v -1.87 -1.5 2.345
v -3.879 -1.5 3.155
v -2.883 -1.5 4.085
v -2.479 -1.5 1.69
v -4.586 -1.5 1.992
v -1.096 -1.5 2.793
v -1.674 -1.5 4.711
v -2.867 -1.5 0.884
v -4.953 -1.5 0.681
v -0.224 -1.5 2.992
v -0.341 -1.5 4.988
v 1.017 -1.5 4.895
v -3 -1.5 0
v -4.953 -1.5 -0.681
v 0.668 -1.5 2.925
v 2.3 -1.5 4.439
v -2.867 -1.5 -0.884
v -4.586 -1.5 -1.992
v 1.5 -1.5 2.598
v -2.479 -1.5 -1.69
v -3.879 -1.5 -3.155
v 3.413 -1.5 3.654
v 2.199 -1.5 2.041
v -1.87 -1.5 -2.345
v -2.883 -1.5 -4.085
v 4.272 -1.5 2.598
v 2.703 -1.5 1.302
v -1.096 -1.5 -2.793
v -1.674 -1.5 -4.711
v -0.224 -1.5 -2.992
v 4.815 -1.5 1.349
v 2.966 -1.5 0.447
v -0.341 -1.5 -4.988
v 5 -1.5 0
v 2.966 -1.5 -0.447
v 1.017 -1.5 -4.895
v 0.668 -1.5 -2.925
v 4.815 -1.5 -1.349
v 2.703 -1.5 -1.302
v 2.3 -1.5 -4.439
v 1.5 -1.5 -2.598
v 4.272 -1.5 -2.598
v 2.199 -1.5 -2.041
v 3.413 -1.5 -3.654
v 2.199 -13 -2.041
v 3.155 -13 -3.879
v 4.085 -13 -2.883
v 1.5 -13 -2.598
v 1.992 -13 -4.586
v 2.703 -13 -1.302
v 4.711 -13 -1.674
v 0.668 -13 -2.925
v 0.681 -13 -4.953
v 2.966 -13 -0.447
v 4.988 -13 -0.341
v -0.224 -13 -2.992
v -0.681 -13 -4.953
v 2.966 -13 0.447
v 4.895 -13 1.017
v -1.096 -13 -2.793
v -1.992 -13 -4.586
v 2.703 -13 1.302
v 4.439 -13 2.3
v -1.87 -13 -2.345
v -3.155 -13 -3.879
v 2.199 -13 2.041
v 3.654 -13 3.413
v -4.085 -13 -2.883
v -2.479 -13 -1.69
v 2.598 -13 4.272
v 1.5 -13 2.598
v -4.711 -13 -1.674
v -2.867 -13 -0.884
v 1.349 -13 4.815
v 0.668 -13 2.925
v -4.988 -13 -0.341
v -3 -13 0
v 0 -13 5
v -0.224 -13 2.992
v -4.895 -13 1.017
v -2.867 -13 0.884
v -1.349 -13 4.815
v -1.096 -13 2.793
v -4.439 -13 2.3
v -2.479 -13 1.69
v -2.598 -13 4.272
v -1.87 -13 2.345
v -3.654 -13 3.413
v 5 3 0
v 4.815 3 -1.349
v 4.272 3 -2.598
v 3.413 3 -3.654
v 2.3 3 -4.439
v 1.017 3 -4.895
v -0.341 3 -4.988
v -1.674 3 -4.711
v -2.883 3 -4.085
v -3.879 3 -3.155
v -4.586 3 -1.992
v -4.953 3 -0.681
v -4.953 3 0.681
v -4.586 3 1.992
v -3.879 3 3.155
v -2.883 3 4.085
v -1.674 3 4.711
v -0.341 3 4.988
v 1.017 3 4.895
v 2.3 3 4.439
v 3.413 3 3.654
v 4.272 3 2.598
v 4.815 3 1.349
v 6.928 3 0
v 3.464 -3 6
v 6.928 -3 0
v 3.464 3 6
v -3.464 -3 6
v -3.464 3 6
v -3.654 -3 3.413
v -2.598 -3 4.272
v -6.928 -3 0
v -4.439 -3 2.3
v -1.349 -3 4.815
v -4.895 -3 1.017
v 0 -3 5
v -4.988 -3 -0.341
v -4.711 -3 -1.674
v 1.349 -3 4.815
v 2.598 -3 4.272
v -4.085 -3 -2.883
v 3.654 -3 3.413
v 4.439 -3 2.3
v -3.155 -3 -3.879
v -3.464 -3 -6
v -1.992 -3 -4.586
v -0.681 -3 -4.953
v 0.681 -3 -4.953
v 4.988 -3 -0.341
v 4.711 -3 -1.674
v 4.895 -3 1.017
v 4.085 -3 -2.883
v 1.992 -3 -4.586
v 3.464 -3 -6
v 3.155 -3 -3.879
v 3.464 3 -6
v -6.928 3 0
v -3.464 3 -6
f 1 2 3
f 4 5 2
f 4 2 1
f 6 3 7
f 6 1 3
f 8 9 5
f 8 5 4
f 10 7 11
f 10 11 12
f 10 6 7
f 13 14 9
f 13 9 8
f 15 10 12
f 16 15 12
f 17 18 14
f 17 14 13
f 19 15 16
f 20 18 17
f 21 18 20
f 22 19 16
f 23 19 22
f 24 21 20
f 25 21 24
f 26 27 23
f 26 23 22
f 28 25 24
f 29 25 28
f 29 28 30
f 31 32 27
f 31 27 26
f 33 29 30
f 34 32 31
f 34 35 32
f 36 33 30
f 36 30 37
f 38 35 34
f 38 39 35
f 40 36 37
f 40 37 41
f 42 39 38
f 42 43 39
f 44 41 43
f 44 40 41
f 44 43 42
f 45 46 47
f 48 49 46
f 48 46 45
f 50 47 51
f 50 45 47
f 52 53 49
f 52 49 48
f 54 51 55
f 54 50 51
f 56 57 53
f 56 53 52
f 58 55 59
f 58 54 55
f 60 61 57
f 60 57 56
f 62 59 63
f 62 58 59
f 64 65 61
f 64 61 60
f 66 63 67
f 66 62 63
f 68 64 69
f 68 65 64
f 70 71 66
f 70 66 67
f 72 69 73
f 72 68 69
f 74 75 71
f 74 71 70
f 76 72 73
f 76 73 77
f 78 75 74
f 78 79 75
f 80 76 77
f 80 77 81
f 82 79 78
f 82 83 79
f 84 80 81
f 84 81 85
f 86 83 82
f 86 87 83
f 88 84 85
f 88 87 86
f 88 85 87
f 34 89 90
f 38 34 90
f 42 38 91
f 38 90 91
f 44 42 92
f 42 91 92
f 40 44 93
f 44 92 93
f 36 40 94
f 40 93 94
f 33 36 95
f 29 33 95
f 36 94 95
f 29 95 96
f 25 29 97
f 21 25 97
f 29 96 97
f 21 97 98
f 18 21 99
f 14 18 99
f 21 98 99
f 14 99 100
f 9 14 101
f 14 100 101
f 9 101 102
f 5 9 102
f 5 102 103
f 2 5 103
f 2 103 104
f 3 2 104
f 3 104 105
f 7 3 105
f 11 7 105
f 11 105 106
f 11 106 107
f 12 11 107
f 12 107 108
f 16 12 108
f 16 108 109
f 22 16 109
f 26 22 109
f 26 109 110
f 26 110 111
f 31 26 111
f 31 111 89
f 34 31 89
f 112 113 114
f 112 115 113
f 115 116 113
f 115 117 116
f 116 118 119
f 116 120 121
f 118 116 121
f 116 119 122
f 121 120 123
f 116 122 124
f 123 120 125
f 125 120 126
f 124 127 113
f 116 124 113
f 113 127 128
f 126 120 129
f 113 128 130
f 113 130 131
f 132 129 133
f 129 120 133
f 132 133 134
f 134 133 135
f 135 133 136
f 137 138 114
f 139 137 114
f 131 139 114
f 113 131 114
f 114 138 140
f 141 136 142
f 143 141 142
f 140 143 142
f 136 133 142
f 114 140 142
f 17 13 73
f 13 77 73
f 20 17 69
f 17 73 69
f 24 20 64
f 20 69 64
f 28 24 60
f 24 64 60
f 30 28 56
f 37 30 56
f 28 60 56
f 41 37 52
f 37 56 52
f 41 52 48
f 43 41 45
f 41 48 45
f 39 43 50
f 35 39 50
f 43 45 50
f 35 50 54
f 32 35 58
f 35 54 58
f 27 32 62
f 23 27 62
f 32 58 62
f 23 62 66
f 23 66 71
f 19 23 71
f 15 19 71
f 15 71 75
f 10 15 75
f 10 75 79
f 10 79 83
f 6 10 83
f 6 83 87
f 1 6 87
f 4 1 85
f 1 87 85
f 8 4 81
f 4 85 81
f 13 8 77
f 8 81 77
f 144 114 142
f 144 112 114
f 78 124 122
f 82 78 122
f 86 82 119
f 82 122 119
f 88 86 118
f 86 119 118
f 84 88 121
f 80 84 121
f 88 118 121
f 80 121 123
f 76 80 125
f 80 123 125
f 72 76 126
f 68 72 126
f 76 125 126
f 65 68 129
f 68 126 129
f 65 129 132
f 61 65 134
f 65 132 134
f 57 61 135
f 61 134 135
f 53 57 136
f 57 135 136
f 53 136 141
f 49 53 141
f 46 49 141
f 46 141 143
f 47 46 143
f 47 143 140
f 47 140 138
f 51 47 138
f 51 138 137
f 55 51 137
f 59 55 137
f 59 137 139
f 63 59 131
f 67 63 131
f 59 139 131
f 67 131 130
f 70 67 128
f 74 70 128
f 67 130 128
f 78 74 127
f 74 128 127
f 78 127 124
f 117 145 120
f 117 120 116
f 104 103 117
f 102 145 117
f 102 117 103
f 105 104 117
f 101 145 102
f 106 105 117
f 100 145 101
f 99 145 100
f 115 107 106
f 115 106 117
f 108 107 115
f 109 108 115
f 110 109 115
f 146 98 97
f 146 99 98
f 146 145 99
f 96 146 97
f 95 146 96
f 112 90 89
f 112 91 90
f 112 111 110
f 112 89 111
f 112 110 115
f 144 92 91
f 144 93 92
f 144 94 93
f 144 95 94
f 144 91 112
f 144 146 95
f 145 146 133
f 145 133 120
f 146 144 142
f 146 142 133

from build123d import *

# Parameters (mm, degrees)
EXTRUDE_1_DEPTH              = 3
SKETCH_2_R                   = 5
EXTRUDE_2_DEPTH              = 10
HOLE_WIZARD_M4_1_D           = 6
HOLE_WIZARD_M4_1_CBORE_D     = 10
HOLE_WIZARD_M4_1_CBORE_DEPTH = 4.5


with BuildPart() as part:
    # 草图1 → 凸台-拉伸1 (new, symmetric)
    with BuildSketch(Plane(origin=(0, 0, 0), x_dir=(1, 0, 0), z_dir=(0, 1, 0))):
        Polygon((6.92820323, 0), (3.464101615, 6), (-3.464101615, 6), (-6.92820323, 0), (-3.464101615, -6), (3.464101615, -6), align=None)
    extrude(amount=EXTRUDE_1_DEPTH, both=True)

    # 草图2 → 凸台-拉伸2 (add)
    with BuildSketch(Plane.XZ.offset(3)):
        with Locations(Location((0, 0, 0), (0, 0, 90))):
            Circle(SKETCH_2_R)
    extrude(amount=EXTRUDE_2_DEPTH)

    # M4 六角头螺栓的柱形沉头孔1 (through all)
    with Locations(Plane(origin=(0, 3, 0), x_dir=(1, 0, 0), z_dir=(0, 1, 0))):
        with Locations((0, 0)):
            CounterBoreHole(HOLE_WIZARD_M4_1_D / 2, HOLE_WIZARD_M4_1_CBORE_D / 2, HOLE_WIZARD_M4_1_CBORE_DEPTH)


solid = part.part
